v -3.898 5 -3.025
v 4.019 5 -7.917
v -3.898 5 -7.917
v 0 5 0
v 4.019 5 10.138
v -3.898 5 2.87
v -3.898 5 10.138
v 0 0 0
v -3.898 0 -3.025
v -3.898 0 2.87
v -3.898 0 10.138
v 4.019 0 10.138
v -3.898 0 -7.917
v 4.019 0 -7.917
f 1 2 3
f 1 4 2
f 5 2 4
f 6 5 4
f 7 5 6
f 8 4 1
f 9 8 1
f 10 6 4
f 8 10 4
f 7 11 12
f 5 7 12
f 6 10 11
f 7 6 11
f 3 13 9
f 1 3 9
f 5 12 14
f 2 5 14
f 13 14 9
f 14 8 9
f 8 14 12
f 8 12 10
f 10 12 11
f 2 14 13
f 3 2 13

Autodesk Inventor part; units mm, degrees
ref_plane "YZ Plane" through (0, 0, 0) normal (1, 0, 0) x (0, 1, 0)
ref_plane "XZ Plane" through (0, 0, 0) normal (0, 1, 0) x (-1, 0, 0)
ref_plane "XY Plane" through (0, 0, 0) normal (0, 0, 1) x (1, 0, 0)
sketch "Sketch1" plane through (0, 0, 0) normal (0, 1, 0) x (-1, 0, 0)
  line L0 (-4.019, -7.9168) -> (3.8978, -7.9168)
  line L1 (3.8978, -7.9168) -> (3.8978, 10.1384)
  line L2 (3.8978, 10.1384) -> (-4.019, 10.1384)
  line L3 (-4.019, 10.1384) -> (-4.019, -7.9168)
  point P0 (0, 0)
extrude "Extrusion1" add sketch "Sketch1" along normal blind 5
sketch "Sketch2" plane through (0, 5, 0) normal (0, 1, 0) x (1, 0, 0)
  line L0 (-3.8978, -2.87) -> (0, 0)
  line L1 (0, 0) -> (-3.8978, 3.0252)
  line L2 (4.019, 7.9168) -> (-3.8978, 7.9168) projected
  line L3 (-3.8978, 7.9168) -> (-3.8978, -10.1384) projected
  line L4 (-3.8978, -10.1384) -> (4.019, -10.1384) projected
  line L5 (4.019, -10.1384) -> (4.019, 7.9168) projected
extrude "Extrusion2" cut sketch "Sketch2" against normal blind 5 contours L3 L1 L0
properties part number "Notch_example"
